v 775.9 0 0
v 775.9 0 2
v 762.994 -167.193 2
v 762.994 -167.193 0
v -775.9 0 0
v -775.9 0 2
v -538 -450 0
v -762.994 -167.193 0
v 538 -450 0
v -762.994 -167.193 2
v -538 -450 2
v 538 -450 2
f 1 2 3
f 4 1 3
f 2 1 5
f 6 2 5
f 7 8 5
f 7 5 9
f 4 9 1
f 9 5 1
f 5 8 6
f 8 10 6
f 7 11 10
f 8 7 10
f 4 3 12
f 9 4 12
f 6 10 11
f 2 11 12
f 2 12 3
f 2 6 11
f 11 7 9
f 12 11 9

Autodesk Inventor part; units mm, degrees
ref_plane "YZ Plane" through (0, 0, 0) normal (1, 0, 0) x (0, 1, 0)
ref_plane "XZ Plane" through (0, 0, 0) normal (0, 1, 0) x (-1, 0, 0)
ref_plane "XY Plane" through (0, 0, 0) normal (0, 0, 1) x (1, 0, 0)
sketch "Sketch1" plane through (0, 0, 0) normal (0, 0, 1) x (1, 0, 0)
  line L0 (-776, -450) -> (776, -450)
  line L1 (776, -450) -> (776, 0)
  line L2 (776, 0) -> (-776, 0)
  line L3 (-776, 0) -> (-776, -450)
  point P0 (0, 0)
  point P1 (0, 0)
  dimension "d0" = 450
  dimension "d1" = 1552
extrude "Plate1" add sketch "Sketch1" along normal blind 2
sketch "Sketch2" plane through (0, 0, 2) normal (0, 0, 1) x (1, 0, 0)
  line L0 (776, -450) -> (-776, -450) projected
  line L1 (776, 0) -> (776, -450) projected
  line L2 (-776, 0) -> (776, 0) projected
  line L3 (-776, -450) -> (-776, 0) projected
  line L4 (775.9, 0) -> (762.994, -167.1926)
  line L5 (762.994, -167.1926) -> (538, -450)
  line L6 (776, -450) -> (-776, -450) projected
  point P0 (0, 0)
  point P1 (0, -450)
  dimension "d3" = 0.1
  dimension "d9" = 167.1926
  dimension "d13" = 85.586
  dimension "d14" = 51.495
  dimension "d15" = 538
extrude "Extrusion1" cut sketch "Sketch2" against normal through all contours L0 L5 L4 L2 L1
mirror "Mirror1" about plane through (0, 0, 0) normal (1, 0, 0) of "Extrusion1"
equation "\"d2\" = Thickness"
equation "\"BendReliefWidth\" = Thickness"
equation "\"BendReliefDepth\" = 0.5 * Thickness"
equation "\"CornerReliefSize\" = 4 * Thickness"
equation "\"MinimumRemnant\" = 2 * Thickness"
equation "\"TransitionRadius\" = BendRadius"
equation "\"JacobiRadiusSize\" = BendRadius"
equation "\"GapSize\" = Thickness"
equation "\"Thickness\" = 2"
equation "\"BendRadius\" = 2.75"
properties part number "MSC 704 FACE 4" material "Stainless Steel"
